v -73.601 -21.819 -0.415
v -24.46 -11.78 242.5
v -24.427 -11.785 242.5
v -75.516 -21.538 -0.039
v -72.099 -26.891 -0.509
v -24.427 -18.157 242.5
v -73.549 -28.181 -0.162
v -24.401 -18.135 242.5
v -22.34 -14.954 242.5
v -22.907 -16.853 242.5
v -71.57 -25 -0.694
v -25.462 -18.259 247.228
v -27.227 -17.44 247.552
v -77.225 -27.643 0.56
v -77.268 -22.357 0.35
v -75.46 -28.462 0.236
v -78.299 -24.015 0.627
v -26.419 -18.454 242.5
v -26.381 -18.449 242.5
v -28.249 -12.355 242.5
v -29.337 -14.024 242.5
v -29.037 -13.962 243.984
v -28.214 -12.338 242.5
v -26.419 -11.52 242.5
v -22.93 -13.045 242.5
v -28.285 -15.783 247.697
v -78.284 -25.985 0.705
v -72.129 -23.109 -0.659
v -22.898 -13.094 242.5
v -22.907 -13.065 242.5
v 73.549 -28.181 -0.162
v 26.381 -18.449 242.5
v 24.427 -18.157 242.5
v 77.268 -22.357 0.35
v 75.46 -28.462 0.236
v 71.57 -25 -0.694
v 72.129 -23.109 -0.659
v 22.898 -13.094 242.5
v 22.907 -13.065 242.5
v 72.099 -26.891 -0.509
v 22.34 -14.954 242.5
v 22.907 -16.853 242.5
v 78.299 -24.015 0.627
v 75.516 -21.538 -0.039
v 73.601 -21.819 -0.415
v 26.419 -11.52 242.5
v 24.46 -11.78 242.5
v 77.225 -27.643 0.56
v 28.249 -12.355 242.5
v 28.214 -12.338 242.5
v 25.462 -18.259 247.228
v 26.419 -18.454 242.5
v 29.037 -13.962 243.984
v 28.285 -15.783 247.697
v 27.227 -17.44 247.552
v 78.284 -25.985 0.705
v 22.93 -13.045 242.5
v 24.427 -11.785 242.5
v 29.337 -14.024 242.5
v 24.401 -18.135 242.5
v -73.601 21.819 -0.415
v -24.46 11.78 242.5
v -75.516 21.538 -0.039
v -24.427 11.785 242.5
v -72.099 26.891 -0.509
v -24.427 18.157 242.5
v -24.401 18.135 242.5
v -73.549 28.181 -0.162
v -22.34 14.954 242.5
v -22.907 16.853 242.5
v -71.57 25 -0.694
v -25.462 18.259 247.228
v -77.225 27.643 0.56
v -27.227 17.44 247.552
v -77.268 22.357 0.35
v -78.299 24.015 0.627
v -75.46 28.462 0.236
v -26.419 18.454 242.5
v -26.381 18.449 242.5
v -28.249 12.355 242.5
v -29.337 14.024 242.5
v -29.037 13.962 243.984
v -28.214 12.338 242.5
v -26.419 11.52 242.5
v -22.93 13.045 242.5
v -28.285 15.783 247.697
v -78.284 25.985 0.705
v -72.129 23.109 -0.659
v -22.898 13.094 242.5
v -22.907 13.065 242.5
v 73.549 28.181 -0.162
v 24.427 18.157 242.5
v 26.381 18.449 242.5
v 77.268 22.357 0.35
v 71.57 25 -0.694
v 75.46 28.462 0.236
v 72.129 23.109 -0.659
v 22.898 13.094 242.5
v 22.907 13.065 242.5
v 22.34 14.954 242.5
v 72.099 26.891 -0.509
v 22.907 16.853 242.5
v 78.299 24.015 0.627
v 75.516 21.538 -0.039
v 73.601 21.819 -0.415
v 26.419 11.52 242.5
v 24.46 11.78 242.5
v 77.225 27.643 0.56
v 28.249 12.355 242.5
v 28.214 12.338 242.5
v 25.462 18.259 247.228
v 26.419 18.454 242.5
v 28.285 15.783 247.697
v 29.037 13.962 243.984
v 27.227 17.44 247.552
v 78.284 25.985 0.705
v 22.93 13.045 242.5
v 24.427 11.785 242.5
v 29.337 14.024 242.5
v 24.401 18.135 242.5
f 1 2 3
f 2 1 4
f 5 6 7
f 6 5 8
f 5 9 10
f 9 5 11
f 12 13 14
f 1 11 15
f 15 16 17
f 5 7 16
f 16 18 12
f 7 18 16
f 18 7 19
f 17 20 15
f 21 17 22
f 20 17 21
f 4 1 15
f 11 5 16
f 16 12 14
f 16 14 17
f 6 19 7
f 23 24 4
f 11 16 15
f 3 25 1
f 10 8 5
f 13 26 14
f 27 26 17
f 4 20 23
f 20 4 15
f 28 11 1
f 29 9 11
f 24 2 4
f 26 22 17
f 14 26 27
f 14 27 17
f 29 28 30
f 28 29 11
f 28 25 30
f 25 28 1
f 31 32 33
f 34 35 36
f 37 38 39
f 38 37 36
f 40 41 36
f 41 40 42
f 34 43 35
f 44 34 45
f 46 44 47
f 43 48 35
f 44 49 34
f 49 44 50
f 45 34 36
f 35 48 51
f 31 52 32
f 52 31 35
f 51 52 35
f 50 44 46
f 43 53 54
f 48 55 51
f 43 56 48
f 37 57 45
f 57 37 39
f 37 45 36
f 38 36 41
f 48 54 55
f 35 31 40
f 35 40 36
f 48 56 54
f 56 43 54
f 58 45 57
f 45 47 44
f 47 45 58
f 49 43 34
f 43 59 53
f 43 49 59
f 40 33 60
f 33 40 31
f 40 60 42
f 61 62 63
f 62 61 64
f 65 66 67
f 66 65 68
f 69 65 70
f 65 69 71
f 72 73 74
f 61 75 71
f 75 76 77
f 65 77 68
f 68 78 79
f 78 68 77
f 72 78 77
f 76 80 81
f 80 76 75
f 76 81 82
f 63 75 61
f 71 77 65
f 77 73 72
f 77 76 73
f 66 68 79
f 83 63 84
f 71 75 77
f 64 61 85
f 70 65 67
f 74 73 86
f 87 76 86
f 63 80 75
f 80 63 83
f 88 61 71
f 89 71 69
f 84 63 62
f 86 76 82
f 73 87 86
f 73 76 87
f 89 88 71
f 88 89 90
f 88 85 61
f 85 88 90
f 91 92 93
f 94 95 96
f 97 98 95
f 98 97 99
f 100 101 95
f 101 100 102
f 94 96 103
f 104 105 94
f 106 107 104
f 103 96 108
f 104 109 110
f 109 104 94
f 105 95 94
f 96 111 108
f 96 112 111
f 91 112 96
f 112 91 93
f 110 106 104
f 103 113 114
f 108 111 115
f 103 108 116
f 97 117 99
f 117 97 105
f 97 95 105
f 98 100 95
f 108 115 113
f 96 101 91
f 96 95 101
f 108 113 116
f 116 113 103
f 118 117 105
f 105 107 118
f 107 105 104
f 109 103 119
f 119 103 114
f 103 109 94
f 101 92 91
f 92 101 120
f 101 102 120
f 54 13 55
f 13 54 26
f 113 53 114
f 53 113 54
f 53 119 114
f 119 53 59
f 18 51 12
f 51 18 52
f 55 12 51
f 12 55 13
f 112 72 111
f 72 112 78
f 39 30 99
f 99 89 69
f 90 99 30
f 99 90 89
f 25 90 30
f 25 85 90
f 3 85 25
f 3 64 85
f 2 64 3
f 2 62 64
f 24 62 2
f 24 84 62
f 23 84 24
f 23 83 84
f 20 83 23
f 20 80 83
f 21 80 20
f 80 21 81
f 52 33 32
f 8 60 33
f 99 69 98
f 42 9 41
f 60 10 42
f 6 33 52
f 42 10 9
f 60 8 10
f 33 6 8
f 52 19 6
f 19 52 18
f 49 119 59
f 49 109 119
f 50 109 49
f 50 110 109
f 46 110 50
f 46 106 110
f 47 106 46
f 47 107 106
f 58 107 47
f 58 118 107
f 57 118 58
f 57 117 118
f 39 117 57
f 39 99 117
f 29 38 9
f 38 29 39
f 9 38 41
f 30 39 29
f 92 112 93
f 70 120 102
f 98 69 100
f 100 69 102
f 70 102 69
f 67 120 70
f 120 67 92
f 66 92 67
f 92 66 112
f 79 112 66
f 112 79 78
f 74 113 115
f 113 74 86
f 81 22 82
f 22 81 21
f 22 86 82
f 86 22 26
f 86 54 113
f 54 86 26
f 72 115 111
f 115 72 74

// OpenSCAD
total_height = 250;

top_width = 50;
top_depth = 30;
top_height = 3;

bottom_width = 150;
bottom_depth = 50;

tentacle_radius = 3.5;
tentacle_height = total_height - top_height;

translate([0, 0, total_height - top_height - top_height / 2])
    cube([top_width, top_depth, top_height], true);
    
tentacle_length = sqrt(pow((top_width/2-bottom_width/2), 2) + pow((top_depth/2-bottom_depth/2), 2) + pow((tentacle_height-0), 2));
echo("Tentacle height: ", tentacle_height);
echo("Tentacle length: ", tentacle_length);

y_rotation = atan((bottom_width / 2 - top_width / 2) / tentacle_height);
x_rotation = atan((bottom_depth / 2 - top_depth / 2) / tentacle_height);

module draw_leg() {
    translate([-bottom_width / 2, bottom_depth / 2, 0])
        rotate([x_rotation, y_rotation, 0])
            cylinder(h = tentacle_length, r = tentacle_radius);
}

module draw_legs() {
    draw_leg();
    mirror([1, 0, 0])
        draw_leg();
    mirror([0, 1, 0]) {
        draw_leg();
        mirror([1, 0, 0])
            draw_leg();
    }
}

draw_legs();

module upper_section() {
    hull()
    intersection() {
        draw_legs();
        translate([0, 0, total_height - top_height - top_height / 2])
            cube([top_width * 2, top_depth * 2, top_height * 2], true);
    }
        
}
upper_section();
